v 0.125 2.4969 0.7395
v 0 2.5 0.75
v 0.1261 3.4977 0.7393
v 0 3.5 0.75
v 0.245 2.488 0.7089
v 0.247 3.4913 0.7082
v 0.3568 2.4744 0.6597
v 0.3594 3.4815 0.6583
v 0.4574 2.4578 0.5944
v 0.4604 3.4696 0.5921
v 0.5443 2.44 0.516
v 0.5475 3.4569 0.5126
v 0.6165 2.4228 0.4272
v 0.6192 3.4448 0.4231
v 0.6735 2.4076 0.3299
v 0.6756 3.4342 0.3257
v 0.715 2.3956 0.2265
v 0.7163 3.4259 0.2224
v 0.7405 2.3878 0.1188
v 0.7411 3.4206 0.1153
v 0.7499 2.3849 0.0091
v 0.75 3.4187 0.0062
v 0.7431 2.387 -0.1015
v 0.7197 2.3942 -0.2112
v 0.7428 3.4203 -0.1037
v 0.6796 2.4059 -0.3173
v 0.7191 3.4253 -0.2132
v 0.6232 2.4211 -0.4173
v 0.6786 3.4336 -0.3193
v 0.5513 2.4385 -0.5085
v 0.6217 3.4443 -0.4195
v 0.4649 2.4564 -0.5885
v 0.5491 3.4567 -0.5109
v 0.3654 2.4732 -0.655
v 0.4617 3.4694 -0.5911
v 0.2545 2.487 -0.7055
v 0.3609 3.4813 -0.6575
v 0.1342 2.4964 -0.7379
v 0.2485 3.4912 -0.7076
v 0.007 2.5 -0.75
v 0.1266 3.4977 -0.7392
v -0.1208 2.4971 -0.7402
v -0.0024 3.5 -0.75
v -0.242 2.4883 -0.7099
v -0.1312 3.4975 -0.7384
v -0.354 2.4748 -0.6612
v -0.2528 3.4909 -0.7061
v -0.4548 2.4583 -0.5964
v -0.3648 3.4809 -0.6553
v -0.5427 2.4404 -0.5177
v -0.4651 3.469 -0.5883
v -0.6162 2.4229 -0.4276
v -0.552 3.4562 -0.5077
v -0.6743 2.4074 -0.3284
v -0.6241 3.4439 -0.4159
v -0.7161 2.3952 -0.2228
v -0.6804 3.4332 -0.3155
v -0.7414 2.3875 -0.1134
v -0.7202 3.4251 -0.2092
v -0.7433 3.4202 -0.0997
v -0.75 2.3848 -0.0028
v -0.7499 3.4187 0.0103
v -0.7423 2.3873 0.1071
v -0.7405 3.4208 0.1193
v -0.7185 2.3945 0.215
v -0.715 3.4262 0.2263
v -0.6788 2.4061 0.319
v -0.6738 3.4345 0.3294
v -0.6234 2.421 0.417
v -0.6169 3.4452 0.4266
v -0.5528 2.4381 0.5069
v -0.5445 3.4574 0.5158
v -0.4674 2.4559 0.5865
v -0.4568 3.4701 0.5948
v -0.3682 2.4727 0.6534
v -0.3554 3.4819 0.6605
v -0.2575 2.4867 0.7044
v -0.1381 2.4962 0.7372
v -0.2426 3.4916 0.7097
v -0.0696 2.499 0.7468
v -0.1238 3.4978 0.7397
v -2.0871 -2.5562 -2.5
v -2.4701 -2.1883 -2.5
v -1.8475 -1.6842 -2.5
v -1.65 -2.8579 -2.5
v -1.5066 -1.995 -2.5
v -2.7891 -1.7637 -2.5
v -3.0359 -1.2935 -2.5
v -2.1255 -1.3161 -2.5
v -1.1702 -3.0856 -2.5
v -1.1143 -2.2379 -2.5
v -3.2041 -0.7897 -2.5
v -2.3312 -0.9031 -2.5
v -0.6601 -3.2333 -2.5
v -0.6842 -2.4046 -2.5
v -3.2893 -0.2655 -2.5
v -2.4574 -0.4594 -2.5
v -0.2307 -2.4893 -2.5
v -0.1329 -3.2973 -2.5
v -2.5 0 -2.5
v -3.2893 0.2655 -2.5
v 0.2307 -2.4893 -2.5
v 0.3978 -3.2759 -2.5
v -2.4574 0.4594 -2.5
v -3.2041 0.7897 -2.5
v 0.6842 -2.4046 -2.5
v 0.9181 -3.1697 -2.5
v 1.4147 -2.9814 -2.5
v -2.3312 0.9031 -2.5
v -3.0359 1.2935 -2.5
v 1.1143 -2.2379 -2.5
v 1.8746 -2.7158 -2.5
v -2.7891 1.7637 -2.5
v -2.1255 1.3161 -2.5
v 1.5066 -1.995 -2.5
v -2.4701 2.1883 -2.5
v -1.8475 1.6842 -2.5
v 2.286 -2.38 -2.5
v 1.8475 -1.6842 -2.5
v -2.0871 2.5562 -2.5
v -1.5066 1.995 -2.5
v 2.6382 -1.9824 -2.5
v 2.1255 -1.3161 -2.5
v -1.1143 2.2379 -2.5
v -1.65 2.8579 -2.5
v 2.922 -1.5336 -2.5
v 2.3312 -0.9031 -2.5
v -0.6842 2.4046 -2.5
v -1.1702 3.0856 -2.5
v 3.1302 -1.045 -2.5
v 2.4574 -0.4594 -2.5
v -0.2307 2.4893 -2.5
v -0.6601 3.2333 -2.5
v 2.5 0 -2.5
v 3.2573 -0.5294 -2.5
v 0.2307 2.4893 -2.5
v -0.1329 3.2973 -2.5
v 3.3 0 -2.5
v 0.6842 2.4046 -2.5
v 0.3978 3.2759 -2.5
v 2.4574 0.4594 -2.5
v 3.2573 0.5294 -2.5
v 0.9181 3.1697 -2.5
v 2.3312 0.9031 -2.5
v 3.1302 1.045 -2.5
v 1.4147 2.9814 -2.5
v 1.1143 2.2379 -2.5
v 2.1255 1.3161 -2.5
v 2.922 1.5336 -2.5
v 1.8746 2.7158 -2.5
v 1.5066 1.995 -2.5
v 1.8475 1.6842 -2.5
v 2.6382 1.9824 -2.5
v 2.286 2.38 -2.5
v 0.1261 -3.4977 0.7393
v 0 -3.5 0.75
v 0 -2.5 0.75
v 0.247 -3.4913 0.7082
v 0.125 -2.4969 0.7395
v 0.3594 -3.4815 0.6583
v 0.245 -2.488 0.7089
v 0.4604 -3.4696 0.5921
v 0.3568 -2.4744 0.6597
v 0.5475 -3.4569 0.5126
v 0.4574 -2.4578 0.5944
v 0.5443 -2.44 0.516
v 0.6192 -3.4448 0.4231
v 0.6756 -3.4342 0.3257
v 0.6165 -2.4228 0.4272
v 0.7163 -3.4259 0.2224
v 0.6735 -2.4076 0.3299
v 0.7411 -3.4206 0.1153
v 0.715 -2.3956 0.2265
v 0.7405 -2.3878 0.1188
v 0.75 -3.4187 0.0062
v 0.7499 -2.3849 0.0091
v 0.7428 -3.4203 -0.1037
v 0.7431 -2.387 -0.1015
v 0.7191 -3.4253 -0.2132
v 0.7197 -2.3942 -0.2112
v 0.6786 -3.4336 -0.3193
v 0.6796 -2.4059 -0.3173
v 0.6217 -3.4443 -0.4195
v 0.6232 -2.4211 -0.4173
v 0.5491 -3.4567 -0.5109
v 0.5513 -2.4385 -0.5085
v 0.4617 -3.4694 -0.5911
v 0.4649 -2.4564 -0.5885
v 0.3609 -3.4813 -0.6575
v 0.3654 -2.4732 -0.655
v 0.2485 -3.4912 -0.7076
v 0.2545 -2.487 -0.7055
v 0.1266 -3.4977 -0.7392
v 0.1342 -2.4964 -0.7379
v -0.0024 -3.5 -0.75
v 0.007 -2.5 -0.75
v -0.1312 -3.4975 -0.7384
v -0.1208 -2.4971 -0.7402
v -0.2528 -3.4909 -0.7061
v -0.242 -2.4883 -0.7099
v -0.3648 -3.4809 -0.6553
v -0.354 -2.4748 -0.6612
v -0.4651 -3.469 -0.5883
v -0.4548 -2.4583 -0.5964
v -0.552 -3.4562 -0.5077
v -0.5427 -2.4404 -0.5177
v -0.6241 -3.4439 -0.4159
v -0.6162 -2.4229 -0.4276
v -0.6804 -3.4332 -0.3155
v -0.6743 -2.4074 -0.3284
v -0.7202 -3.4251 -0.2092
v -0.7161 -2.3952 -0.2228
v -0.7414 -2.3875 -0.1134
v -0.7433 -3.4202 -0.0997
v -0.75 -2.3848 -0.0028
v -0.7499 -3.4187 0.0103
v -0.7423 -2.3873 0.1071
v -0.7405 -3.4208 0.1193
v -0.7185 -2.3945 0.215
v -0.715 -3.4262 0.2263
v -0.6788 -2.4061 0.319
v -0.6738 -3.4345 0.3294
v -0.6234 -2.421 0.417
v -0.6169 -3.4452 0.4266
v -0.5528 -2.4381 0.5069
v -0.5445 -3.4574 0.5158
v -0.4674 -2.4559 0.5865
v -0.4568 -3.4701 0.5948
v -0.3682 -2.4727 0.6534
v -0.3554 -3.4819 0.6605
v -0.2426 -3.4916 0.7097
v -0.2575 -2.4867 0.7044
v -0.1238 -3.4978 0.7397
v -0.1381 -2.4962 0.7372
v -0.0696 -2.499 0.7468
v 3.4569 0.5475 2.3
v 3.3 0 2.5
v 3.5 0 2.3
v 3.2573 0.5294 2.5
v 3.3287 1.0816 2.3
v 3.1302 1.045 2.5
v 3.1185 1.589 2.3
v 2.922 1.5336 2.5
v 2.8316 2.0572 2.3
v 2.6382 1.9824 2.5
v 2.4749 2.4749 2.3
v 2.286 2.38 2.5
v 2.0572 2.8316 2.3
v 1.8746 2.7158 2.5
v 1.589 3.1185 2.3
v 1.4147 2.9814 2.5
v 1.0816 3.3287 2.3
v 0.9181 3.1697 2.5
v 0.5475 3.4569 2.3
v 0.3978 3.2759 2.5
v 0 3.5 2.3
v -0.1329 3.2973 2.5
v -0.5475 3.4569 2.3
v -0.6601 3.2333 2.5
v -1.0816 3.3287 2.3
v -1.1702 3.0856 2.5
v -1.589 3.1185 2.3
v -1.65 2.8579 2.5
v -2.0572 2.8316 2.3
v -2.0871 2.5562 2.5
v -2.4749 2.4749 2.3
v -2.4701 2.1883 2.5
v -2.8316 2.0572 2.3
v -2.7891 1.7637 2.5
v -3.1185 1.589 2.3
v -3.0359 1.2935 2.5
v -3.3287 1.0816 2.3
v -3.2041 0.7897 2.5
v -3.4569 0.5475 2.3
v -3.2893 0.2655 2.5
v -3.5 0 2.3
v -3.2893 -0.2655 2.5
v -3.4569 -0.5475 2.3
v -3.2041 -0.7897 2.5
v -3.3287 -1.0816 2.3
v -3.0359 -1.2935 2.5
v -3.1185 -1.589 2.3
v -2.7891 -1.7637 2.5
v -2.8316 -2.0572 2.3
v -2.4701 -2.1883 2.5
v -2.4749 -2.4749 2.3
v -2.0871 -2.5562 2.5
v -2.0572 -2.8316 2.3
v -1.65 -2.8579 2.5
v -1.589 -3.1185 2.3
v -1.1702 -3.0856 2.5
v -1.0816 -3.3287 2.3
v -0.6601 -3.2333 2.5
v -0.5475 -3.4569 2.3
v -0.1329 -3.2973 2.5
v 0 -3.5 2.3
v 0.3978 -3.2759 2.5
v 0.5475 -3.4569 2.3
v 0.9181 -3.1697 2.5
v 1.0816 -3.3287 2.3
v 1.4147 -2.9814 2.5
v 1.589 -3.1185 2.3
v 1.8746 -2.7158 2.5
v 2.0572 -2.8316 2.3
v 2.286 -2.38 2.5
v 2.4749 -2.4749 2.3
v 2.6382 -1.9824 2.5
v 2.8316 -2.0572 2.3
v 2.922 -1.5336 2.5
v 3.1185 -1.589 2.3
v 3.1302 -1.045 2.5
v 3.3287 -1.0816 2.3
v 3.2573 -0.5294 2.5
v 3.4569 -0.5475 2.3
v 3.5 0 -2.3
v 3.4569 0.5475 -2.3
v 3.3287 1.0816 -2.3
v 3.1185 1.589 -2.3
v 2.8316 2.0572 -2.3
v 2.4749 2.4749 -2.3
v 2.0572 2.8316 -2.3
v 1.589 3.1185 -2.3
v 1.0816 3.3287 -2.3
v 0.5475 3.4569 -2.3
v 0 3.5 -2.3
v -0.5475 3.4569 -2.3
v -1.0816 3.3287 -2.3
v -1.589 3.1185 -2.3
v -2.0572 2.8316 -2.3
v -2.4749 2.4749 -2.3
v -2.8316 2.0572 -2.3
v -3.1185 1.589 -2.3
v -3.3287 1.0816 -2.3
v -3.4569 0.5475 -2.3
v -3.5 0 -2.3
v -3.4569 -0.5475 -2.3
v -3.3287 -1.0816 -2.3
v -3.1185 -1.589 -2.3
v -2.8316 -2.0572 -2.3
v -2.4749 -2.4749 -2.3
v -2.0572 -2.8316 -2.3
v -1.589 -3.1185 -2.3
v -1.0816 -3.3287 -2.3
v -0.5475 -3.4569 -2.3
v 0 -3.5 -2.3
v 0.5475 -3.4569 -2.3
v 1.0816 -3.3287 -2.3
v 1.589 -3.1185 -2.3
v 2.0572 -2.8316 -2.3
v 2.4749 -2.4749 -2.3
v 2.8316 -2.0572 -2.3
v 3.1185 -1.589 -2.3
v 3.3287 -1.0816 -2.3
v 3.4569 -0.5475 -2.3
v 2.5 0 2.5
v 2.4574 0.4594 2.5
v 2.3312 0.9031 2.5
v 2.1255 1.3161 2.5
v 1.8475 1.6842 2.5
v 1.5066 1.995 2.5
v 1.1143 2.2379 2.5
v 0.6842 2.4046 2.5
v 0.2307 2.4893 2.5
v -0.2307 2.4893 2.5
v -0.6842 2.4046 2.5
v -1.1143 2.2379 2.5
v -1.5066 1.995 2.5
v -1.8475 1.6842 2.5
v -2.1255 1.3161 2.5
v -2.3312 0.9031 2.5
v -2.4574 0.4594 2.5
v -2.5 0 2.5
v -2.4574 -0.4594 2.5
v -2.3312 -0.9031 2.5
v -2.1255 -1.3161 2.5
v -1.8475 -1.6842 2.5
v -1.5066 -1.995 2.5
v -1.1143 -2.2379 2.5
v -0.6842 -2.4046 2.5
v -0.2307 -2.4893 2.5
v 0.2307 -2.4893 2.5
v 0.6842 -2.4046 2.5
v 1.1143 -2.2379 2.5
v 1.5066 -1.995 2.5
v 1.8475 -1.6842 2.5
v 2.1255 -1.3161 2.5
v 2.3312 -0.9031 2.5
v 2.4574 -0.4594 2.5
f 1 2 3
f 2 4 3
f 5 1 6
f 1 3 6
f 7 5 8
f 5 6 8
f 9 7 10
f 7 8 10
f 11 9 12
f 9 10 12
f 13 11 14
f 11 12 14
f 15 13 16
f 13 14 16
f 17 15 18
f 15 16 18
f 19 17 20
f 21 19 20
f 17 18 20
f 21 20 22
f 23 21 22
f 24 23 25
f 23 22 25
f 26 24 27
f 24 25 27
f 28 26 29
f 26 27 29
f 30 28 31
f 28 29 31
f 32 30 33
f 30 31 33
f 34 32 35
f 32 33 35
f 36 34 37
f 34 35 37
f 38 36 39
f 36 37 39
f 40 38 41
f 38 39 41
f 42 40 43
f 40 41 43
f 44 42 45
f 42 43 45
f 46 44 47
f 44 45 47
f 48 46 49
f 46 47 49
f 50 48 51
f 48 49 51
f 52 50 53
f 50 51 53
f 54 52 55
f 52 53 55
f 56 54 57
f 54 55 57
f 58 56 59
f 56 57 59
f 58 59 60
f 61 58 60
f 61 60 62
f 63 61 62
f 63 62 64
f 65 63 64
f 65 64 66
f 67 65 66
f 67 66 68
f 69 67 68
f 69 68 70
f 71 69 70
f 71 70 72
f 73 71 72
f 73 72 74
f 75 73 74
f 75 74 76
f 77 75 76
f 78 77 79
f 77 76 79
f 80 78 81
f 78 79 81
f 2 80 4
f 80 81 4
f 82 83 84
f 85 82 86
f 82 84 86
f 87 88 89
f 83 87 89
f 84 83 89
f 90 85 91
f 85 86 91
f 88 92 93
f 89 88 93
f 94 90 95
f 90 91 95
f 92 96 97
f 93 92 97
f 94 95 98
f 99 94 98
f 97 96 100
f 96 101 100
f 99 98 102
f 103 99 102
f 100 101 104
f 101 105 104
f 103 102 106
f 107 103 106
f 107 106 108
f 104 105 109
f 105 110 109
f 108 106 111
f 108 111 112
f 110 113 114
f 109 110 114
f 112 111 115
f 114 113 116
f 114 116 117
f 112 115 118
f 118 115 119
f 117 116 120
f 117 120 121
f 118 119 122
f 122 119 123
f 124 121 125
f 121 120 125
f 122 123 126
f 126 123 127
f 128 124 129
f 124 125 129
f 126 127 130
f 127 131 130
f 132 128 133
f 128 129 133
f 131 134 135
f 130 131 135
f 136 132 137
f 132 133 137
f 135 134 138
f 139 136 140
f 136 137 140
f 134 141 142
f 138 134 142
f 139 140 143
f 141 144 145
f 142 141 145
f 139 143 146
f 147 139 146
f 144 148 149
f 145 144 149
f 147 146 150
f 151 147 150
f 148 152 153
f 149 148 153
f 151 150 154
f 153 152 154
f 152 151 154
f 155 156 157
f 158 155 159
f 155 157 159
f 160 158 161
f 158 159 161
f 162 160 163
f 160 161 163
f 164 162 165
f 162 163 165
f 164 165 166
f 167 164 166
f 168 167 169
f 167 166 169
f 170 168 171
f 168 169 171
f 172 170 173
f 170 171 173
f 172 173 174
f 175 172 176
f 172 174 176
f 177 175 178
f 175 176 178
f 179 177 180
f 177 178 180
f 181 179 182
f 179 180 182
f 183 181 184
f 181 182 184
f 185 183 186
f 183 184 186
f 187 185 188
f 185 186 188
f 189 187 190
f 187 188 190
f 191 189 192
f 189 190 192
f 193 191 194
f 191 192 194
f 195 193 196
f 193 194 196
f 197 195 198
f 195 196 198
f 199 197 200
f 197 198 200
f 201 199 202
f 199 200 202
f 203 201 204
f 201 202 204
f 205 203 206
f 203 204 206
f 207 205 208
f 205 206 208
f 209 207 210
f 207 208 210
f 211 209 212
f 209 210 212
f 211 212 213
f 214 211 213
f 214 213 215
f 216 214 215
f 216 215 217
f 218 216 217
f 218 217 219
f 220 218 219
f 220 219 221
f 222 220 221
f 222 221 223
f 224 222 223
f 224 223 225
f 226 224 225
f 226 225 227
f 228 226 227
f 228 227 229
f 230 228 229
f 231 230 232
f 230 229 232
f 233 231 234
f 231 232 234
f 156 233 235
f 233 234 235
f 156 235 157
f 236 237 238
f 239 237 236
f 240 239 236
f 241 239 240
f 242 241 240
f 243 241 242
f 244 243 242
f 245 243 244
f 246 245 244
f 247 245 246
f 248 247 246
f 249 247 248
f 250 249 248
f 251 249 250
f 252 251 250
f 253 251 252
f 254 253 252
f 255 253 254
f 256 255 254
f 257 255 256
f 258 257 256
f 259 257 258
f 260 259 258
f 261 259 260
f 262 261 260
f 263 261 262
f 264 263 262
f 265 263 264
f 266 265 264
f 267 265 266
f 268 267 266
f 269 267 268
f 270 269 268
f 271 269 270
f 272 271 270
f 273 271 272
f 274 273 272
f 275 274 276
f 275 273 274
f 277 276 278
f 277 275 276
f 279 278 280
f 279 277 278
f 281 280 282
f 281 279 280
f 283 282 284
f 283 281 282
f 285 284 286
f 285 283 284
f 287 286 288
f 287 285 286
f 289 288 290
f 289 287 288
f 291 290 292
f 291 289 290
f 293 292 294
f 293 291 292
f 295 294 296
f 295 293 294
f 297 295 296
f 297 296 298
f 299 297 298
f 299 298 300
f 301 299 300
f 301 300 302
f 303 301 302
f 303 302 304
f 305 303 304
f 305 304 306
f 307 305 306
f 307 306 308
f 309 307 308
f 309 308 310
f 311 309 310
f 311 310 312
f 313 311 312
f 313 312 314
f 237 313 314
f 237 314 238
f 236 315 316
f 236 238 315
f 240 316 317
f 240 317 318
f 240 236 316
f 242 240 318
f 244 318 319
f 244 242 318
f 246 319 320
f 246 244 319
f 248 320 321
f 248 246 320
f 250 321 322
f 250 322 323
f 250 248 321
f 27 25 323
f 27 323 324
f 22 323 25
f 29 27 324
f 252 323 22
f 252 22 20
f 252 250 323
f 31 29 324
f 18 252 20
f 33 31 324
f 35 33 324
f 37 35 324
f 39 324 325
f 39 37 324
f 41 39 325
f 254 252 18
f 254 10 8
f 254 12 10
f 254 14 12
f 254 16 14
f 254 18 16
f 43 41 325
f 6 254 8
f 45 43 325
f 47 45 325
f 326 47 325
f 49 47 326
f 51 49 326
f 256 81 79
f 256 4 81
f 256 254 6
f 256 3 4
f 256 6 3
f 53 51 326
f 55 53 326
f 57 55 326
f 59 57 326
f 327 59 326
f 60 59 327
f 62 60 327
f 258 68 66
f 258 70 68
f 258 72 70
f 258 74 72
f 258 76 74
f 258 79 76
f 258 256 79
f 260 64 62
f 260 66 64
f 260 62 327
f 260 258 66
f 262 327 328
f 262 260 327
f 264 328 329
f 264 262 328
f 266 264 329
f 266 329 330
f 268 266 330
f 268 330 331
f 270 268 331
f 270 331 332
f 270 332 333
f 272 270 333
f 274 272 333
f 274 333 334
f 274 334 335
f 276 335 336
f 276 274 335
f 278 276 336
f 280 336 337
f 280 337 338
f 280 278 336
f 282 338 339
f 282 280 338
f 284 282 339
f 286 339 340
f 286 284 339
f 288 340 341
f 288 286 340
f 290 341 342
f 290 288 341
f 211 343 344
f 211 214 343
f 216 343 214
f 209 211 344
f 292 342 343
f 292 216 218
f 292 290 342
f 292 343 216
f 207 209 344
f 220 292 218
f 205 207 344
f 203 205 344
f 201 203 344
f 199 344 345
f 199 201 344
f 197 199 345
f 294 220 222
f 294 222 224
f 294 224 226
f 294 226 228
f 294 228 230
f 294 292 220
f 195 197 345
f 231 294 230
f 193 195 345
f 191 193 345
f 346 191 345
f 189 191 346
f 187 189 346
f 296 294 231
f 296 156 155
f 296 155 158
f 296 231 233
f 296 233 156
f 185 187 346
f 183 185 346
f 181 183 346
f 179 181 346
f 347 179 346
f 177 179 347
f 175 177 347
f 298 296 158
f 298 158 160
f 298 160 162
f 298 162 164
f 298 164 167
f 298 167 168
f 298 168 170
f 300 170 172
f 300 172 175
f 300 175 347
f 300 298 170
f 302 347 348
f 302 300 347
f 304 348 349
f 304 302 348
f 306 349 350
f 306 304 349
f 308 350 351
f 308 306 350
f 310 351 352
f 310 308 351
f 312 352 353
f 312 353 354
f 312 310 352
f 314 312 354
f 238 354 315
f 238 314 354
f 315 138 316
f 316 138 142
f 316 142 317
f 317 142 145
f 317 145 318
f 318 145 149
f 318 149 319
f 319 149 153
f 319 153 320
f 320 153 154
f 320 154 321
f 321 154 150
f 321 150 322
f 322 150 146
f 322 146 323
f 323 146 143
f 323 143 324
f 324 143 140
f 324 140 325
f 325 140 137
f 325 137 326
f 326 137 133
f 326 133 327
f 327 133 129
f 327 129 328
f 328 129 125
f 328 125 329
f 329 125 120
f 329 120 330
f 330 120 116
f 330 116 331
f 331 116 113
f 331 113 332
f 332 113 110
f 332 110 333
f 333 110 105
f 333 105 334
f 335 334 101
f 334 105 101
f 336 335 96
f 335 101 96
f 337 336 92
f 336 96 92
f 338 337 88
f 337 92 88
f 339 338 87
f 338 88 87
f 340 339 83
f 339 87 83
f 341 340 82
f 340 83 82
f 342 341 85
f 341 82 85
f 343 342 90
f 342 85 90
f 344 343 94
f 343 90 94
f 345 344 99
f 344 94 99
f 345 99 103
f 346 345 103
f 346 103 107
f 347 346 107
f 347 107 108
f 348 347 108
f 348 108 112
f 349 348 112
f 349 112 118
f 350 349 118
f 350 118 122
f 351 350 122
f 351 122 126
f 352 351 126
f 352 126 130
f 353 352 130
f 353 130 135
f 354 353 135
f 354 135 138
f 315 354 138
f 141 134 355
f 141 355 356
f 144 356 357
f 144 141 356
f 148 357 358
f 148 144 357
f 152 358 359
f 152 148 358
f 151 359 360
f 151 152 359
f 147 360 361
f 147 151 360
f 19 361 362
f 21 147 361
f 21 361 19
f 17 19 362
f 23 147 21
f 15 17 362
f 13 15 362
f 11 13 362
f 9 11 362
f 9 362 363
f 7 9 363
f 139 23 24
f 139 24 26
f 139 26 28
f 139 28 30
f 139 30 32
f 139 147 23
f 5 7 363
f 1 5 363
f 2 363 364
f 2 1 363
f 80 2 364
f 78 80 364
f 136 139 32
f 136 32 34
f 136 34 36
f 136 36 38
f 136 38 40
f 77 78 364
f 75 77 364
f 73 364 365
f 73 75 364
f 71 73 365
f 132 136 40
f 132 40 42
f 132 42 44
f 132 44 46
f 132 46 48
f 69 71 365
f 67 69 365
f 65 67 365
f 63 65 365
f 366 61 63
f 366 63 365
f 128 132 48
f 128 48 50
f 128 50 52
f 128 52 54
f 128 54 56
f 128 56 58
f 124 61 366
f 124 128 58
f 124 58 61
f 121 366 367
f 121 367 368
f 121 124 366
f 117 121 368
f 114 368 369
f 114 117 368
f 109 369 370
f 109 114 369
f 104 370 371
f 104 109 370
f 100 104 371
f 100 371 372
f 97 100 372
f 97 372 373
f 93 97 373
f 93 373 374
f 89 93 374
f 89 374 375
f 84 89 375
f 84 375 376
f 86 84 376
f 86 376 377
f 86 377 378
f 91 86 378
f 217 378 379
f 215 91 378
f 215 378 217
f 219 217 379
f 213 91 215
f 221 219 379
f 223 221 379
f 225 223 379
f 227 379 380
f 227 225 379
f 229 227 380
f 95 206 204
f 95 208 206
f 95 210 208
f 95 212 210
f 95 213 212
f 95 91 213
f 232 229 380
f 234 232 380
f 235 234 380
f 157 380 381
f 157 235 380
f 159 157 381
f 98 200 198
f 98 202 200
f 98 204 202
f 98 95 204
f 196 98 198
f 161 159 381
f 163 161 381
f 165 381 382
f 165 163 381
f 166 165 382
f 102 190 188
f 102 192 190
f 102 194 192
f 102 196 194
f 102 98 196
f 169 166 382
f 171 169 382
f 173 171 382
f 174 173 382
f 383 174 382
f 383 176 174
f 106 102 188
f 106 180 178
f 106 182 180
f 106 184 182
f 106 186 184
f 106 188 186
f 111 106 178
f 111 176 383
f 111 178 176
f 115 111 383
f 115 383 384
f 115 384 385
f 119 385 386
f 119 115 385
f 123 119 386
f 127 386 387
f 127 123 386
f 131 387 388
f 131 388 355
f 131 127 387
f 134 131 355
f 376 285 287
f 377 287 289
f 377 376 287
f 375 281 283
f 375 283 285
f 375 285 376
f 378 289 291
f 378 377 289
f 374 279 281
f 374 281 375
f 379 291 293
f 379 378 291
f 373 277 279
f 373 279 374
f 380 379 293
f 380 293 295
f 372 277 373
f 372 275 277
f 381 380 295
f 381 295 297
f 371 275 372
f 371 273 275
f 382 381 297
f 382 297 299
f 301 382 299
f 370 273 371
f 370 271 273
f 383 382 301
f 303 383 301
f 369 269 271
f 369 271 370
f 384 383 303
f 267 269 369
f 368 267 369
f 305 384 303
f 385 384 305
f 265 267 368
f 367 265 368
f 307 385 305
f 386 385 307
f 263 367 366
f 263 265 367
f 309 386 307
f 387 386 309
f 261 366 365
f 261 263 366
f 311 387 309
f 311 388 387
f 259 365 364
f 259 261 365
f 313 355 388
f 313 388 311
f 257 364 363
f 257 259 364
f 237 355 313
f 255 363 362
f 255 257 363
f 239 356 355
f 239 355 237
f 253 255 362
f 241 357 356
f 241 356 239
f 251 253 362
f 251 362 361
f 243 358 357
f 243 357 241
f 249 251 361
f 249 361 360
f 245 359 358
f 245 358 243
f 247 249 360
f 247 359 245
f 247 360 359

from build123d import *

# Parameters (mm, degrees)
ESQUISSE1_R             = 3.5
ESQUISSE1_R_2           = 2.5
BASE_EXTRU_MINCE_DEPTH  = 2.5
CHANFREIN1_SIZE         = 0.2
ESQUISSE2_R             = 0.75
ENL_V_MAT_EXTRU_1_DEPTH = 5


with BuildPart() as part:
    # Esquisse1 → Base-Extru.-Mince (new, symmetric)
    with BuildSketch(Plane.XY):
        Circle(ESQUISSE1_R)
        Circle(ESQUISSE1_R_2, mode=Mode.SUBTRACT)
    extrude(amount=BASE_EXTRU_MINCE_DEPTH, both=True)

    # Chanfrein1
    chanfrein1_edges = [part.edges().sort_by_distance(p)[0] for p in [
        (-3.5, 0, -2.5),
        (-3.5, 0, 2.5),
    ]]
    chamfer(chanfrein1_edges, length=CHANFREIN1_SIZE)

    # Esquisse2 → Enlèv. mat.-Extru.1 (cut, symmetric)
    with BuildSketch(Plane(origin=(0, 0, 0), x_dir=(1, 0, 0), z_dir=(0, 1, 0))):
        with Locations(Location((0, 0, 0), (0, 0, 270))):
            Circle(ESQUISSE2_R)
    extrude(amount=ENL_V_MAT_EXTRU_1_DEPTH, both=True, mode=Mode.SUBTRACT)


solid = part.part
